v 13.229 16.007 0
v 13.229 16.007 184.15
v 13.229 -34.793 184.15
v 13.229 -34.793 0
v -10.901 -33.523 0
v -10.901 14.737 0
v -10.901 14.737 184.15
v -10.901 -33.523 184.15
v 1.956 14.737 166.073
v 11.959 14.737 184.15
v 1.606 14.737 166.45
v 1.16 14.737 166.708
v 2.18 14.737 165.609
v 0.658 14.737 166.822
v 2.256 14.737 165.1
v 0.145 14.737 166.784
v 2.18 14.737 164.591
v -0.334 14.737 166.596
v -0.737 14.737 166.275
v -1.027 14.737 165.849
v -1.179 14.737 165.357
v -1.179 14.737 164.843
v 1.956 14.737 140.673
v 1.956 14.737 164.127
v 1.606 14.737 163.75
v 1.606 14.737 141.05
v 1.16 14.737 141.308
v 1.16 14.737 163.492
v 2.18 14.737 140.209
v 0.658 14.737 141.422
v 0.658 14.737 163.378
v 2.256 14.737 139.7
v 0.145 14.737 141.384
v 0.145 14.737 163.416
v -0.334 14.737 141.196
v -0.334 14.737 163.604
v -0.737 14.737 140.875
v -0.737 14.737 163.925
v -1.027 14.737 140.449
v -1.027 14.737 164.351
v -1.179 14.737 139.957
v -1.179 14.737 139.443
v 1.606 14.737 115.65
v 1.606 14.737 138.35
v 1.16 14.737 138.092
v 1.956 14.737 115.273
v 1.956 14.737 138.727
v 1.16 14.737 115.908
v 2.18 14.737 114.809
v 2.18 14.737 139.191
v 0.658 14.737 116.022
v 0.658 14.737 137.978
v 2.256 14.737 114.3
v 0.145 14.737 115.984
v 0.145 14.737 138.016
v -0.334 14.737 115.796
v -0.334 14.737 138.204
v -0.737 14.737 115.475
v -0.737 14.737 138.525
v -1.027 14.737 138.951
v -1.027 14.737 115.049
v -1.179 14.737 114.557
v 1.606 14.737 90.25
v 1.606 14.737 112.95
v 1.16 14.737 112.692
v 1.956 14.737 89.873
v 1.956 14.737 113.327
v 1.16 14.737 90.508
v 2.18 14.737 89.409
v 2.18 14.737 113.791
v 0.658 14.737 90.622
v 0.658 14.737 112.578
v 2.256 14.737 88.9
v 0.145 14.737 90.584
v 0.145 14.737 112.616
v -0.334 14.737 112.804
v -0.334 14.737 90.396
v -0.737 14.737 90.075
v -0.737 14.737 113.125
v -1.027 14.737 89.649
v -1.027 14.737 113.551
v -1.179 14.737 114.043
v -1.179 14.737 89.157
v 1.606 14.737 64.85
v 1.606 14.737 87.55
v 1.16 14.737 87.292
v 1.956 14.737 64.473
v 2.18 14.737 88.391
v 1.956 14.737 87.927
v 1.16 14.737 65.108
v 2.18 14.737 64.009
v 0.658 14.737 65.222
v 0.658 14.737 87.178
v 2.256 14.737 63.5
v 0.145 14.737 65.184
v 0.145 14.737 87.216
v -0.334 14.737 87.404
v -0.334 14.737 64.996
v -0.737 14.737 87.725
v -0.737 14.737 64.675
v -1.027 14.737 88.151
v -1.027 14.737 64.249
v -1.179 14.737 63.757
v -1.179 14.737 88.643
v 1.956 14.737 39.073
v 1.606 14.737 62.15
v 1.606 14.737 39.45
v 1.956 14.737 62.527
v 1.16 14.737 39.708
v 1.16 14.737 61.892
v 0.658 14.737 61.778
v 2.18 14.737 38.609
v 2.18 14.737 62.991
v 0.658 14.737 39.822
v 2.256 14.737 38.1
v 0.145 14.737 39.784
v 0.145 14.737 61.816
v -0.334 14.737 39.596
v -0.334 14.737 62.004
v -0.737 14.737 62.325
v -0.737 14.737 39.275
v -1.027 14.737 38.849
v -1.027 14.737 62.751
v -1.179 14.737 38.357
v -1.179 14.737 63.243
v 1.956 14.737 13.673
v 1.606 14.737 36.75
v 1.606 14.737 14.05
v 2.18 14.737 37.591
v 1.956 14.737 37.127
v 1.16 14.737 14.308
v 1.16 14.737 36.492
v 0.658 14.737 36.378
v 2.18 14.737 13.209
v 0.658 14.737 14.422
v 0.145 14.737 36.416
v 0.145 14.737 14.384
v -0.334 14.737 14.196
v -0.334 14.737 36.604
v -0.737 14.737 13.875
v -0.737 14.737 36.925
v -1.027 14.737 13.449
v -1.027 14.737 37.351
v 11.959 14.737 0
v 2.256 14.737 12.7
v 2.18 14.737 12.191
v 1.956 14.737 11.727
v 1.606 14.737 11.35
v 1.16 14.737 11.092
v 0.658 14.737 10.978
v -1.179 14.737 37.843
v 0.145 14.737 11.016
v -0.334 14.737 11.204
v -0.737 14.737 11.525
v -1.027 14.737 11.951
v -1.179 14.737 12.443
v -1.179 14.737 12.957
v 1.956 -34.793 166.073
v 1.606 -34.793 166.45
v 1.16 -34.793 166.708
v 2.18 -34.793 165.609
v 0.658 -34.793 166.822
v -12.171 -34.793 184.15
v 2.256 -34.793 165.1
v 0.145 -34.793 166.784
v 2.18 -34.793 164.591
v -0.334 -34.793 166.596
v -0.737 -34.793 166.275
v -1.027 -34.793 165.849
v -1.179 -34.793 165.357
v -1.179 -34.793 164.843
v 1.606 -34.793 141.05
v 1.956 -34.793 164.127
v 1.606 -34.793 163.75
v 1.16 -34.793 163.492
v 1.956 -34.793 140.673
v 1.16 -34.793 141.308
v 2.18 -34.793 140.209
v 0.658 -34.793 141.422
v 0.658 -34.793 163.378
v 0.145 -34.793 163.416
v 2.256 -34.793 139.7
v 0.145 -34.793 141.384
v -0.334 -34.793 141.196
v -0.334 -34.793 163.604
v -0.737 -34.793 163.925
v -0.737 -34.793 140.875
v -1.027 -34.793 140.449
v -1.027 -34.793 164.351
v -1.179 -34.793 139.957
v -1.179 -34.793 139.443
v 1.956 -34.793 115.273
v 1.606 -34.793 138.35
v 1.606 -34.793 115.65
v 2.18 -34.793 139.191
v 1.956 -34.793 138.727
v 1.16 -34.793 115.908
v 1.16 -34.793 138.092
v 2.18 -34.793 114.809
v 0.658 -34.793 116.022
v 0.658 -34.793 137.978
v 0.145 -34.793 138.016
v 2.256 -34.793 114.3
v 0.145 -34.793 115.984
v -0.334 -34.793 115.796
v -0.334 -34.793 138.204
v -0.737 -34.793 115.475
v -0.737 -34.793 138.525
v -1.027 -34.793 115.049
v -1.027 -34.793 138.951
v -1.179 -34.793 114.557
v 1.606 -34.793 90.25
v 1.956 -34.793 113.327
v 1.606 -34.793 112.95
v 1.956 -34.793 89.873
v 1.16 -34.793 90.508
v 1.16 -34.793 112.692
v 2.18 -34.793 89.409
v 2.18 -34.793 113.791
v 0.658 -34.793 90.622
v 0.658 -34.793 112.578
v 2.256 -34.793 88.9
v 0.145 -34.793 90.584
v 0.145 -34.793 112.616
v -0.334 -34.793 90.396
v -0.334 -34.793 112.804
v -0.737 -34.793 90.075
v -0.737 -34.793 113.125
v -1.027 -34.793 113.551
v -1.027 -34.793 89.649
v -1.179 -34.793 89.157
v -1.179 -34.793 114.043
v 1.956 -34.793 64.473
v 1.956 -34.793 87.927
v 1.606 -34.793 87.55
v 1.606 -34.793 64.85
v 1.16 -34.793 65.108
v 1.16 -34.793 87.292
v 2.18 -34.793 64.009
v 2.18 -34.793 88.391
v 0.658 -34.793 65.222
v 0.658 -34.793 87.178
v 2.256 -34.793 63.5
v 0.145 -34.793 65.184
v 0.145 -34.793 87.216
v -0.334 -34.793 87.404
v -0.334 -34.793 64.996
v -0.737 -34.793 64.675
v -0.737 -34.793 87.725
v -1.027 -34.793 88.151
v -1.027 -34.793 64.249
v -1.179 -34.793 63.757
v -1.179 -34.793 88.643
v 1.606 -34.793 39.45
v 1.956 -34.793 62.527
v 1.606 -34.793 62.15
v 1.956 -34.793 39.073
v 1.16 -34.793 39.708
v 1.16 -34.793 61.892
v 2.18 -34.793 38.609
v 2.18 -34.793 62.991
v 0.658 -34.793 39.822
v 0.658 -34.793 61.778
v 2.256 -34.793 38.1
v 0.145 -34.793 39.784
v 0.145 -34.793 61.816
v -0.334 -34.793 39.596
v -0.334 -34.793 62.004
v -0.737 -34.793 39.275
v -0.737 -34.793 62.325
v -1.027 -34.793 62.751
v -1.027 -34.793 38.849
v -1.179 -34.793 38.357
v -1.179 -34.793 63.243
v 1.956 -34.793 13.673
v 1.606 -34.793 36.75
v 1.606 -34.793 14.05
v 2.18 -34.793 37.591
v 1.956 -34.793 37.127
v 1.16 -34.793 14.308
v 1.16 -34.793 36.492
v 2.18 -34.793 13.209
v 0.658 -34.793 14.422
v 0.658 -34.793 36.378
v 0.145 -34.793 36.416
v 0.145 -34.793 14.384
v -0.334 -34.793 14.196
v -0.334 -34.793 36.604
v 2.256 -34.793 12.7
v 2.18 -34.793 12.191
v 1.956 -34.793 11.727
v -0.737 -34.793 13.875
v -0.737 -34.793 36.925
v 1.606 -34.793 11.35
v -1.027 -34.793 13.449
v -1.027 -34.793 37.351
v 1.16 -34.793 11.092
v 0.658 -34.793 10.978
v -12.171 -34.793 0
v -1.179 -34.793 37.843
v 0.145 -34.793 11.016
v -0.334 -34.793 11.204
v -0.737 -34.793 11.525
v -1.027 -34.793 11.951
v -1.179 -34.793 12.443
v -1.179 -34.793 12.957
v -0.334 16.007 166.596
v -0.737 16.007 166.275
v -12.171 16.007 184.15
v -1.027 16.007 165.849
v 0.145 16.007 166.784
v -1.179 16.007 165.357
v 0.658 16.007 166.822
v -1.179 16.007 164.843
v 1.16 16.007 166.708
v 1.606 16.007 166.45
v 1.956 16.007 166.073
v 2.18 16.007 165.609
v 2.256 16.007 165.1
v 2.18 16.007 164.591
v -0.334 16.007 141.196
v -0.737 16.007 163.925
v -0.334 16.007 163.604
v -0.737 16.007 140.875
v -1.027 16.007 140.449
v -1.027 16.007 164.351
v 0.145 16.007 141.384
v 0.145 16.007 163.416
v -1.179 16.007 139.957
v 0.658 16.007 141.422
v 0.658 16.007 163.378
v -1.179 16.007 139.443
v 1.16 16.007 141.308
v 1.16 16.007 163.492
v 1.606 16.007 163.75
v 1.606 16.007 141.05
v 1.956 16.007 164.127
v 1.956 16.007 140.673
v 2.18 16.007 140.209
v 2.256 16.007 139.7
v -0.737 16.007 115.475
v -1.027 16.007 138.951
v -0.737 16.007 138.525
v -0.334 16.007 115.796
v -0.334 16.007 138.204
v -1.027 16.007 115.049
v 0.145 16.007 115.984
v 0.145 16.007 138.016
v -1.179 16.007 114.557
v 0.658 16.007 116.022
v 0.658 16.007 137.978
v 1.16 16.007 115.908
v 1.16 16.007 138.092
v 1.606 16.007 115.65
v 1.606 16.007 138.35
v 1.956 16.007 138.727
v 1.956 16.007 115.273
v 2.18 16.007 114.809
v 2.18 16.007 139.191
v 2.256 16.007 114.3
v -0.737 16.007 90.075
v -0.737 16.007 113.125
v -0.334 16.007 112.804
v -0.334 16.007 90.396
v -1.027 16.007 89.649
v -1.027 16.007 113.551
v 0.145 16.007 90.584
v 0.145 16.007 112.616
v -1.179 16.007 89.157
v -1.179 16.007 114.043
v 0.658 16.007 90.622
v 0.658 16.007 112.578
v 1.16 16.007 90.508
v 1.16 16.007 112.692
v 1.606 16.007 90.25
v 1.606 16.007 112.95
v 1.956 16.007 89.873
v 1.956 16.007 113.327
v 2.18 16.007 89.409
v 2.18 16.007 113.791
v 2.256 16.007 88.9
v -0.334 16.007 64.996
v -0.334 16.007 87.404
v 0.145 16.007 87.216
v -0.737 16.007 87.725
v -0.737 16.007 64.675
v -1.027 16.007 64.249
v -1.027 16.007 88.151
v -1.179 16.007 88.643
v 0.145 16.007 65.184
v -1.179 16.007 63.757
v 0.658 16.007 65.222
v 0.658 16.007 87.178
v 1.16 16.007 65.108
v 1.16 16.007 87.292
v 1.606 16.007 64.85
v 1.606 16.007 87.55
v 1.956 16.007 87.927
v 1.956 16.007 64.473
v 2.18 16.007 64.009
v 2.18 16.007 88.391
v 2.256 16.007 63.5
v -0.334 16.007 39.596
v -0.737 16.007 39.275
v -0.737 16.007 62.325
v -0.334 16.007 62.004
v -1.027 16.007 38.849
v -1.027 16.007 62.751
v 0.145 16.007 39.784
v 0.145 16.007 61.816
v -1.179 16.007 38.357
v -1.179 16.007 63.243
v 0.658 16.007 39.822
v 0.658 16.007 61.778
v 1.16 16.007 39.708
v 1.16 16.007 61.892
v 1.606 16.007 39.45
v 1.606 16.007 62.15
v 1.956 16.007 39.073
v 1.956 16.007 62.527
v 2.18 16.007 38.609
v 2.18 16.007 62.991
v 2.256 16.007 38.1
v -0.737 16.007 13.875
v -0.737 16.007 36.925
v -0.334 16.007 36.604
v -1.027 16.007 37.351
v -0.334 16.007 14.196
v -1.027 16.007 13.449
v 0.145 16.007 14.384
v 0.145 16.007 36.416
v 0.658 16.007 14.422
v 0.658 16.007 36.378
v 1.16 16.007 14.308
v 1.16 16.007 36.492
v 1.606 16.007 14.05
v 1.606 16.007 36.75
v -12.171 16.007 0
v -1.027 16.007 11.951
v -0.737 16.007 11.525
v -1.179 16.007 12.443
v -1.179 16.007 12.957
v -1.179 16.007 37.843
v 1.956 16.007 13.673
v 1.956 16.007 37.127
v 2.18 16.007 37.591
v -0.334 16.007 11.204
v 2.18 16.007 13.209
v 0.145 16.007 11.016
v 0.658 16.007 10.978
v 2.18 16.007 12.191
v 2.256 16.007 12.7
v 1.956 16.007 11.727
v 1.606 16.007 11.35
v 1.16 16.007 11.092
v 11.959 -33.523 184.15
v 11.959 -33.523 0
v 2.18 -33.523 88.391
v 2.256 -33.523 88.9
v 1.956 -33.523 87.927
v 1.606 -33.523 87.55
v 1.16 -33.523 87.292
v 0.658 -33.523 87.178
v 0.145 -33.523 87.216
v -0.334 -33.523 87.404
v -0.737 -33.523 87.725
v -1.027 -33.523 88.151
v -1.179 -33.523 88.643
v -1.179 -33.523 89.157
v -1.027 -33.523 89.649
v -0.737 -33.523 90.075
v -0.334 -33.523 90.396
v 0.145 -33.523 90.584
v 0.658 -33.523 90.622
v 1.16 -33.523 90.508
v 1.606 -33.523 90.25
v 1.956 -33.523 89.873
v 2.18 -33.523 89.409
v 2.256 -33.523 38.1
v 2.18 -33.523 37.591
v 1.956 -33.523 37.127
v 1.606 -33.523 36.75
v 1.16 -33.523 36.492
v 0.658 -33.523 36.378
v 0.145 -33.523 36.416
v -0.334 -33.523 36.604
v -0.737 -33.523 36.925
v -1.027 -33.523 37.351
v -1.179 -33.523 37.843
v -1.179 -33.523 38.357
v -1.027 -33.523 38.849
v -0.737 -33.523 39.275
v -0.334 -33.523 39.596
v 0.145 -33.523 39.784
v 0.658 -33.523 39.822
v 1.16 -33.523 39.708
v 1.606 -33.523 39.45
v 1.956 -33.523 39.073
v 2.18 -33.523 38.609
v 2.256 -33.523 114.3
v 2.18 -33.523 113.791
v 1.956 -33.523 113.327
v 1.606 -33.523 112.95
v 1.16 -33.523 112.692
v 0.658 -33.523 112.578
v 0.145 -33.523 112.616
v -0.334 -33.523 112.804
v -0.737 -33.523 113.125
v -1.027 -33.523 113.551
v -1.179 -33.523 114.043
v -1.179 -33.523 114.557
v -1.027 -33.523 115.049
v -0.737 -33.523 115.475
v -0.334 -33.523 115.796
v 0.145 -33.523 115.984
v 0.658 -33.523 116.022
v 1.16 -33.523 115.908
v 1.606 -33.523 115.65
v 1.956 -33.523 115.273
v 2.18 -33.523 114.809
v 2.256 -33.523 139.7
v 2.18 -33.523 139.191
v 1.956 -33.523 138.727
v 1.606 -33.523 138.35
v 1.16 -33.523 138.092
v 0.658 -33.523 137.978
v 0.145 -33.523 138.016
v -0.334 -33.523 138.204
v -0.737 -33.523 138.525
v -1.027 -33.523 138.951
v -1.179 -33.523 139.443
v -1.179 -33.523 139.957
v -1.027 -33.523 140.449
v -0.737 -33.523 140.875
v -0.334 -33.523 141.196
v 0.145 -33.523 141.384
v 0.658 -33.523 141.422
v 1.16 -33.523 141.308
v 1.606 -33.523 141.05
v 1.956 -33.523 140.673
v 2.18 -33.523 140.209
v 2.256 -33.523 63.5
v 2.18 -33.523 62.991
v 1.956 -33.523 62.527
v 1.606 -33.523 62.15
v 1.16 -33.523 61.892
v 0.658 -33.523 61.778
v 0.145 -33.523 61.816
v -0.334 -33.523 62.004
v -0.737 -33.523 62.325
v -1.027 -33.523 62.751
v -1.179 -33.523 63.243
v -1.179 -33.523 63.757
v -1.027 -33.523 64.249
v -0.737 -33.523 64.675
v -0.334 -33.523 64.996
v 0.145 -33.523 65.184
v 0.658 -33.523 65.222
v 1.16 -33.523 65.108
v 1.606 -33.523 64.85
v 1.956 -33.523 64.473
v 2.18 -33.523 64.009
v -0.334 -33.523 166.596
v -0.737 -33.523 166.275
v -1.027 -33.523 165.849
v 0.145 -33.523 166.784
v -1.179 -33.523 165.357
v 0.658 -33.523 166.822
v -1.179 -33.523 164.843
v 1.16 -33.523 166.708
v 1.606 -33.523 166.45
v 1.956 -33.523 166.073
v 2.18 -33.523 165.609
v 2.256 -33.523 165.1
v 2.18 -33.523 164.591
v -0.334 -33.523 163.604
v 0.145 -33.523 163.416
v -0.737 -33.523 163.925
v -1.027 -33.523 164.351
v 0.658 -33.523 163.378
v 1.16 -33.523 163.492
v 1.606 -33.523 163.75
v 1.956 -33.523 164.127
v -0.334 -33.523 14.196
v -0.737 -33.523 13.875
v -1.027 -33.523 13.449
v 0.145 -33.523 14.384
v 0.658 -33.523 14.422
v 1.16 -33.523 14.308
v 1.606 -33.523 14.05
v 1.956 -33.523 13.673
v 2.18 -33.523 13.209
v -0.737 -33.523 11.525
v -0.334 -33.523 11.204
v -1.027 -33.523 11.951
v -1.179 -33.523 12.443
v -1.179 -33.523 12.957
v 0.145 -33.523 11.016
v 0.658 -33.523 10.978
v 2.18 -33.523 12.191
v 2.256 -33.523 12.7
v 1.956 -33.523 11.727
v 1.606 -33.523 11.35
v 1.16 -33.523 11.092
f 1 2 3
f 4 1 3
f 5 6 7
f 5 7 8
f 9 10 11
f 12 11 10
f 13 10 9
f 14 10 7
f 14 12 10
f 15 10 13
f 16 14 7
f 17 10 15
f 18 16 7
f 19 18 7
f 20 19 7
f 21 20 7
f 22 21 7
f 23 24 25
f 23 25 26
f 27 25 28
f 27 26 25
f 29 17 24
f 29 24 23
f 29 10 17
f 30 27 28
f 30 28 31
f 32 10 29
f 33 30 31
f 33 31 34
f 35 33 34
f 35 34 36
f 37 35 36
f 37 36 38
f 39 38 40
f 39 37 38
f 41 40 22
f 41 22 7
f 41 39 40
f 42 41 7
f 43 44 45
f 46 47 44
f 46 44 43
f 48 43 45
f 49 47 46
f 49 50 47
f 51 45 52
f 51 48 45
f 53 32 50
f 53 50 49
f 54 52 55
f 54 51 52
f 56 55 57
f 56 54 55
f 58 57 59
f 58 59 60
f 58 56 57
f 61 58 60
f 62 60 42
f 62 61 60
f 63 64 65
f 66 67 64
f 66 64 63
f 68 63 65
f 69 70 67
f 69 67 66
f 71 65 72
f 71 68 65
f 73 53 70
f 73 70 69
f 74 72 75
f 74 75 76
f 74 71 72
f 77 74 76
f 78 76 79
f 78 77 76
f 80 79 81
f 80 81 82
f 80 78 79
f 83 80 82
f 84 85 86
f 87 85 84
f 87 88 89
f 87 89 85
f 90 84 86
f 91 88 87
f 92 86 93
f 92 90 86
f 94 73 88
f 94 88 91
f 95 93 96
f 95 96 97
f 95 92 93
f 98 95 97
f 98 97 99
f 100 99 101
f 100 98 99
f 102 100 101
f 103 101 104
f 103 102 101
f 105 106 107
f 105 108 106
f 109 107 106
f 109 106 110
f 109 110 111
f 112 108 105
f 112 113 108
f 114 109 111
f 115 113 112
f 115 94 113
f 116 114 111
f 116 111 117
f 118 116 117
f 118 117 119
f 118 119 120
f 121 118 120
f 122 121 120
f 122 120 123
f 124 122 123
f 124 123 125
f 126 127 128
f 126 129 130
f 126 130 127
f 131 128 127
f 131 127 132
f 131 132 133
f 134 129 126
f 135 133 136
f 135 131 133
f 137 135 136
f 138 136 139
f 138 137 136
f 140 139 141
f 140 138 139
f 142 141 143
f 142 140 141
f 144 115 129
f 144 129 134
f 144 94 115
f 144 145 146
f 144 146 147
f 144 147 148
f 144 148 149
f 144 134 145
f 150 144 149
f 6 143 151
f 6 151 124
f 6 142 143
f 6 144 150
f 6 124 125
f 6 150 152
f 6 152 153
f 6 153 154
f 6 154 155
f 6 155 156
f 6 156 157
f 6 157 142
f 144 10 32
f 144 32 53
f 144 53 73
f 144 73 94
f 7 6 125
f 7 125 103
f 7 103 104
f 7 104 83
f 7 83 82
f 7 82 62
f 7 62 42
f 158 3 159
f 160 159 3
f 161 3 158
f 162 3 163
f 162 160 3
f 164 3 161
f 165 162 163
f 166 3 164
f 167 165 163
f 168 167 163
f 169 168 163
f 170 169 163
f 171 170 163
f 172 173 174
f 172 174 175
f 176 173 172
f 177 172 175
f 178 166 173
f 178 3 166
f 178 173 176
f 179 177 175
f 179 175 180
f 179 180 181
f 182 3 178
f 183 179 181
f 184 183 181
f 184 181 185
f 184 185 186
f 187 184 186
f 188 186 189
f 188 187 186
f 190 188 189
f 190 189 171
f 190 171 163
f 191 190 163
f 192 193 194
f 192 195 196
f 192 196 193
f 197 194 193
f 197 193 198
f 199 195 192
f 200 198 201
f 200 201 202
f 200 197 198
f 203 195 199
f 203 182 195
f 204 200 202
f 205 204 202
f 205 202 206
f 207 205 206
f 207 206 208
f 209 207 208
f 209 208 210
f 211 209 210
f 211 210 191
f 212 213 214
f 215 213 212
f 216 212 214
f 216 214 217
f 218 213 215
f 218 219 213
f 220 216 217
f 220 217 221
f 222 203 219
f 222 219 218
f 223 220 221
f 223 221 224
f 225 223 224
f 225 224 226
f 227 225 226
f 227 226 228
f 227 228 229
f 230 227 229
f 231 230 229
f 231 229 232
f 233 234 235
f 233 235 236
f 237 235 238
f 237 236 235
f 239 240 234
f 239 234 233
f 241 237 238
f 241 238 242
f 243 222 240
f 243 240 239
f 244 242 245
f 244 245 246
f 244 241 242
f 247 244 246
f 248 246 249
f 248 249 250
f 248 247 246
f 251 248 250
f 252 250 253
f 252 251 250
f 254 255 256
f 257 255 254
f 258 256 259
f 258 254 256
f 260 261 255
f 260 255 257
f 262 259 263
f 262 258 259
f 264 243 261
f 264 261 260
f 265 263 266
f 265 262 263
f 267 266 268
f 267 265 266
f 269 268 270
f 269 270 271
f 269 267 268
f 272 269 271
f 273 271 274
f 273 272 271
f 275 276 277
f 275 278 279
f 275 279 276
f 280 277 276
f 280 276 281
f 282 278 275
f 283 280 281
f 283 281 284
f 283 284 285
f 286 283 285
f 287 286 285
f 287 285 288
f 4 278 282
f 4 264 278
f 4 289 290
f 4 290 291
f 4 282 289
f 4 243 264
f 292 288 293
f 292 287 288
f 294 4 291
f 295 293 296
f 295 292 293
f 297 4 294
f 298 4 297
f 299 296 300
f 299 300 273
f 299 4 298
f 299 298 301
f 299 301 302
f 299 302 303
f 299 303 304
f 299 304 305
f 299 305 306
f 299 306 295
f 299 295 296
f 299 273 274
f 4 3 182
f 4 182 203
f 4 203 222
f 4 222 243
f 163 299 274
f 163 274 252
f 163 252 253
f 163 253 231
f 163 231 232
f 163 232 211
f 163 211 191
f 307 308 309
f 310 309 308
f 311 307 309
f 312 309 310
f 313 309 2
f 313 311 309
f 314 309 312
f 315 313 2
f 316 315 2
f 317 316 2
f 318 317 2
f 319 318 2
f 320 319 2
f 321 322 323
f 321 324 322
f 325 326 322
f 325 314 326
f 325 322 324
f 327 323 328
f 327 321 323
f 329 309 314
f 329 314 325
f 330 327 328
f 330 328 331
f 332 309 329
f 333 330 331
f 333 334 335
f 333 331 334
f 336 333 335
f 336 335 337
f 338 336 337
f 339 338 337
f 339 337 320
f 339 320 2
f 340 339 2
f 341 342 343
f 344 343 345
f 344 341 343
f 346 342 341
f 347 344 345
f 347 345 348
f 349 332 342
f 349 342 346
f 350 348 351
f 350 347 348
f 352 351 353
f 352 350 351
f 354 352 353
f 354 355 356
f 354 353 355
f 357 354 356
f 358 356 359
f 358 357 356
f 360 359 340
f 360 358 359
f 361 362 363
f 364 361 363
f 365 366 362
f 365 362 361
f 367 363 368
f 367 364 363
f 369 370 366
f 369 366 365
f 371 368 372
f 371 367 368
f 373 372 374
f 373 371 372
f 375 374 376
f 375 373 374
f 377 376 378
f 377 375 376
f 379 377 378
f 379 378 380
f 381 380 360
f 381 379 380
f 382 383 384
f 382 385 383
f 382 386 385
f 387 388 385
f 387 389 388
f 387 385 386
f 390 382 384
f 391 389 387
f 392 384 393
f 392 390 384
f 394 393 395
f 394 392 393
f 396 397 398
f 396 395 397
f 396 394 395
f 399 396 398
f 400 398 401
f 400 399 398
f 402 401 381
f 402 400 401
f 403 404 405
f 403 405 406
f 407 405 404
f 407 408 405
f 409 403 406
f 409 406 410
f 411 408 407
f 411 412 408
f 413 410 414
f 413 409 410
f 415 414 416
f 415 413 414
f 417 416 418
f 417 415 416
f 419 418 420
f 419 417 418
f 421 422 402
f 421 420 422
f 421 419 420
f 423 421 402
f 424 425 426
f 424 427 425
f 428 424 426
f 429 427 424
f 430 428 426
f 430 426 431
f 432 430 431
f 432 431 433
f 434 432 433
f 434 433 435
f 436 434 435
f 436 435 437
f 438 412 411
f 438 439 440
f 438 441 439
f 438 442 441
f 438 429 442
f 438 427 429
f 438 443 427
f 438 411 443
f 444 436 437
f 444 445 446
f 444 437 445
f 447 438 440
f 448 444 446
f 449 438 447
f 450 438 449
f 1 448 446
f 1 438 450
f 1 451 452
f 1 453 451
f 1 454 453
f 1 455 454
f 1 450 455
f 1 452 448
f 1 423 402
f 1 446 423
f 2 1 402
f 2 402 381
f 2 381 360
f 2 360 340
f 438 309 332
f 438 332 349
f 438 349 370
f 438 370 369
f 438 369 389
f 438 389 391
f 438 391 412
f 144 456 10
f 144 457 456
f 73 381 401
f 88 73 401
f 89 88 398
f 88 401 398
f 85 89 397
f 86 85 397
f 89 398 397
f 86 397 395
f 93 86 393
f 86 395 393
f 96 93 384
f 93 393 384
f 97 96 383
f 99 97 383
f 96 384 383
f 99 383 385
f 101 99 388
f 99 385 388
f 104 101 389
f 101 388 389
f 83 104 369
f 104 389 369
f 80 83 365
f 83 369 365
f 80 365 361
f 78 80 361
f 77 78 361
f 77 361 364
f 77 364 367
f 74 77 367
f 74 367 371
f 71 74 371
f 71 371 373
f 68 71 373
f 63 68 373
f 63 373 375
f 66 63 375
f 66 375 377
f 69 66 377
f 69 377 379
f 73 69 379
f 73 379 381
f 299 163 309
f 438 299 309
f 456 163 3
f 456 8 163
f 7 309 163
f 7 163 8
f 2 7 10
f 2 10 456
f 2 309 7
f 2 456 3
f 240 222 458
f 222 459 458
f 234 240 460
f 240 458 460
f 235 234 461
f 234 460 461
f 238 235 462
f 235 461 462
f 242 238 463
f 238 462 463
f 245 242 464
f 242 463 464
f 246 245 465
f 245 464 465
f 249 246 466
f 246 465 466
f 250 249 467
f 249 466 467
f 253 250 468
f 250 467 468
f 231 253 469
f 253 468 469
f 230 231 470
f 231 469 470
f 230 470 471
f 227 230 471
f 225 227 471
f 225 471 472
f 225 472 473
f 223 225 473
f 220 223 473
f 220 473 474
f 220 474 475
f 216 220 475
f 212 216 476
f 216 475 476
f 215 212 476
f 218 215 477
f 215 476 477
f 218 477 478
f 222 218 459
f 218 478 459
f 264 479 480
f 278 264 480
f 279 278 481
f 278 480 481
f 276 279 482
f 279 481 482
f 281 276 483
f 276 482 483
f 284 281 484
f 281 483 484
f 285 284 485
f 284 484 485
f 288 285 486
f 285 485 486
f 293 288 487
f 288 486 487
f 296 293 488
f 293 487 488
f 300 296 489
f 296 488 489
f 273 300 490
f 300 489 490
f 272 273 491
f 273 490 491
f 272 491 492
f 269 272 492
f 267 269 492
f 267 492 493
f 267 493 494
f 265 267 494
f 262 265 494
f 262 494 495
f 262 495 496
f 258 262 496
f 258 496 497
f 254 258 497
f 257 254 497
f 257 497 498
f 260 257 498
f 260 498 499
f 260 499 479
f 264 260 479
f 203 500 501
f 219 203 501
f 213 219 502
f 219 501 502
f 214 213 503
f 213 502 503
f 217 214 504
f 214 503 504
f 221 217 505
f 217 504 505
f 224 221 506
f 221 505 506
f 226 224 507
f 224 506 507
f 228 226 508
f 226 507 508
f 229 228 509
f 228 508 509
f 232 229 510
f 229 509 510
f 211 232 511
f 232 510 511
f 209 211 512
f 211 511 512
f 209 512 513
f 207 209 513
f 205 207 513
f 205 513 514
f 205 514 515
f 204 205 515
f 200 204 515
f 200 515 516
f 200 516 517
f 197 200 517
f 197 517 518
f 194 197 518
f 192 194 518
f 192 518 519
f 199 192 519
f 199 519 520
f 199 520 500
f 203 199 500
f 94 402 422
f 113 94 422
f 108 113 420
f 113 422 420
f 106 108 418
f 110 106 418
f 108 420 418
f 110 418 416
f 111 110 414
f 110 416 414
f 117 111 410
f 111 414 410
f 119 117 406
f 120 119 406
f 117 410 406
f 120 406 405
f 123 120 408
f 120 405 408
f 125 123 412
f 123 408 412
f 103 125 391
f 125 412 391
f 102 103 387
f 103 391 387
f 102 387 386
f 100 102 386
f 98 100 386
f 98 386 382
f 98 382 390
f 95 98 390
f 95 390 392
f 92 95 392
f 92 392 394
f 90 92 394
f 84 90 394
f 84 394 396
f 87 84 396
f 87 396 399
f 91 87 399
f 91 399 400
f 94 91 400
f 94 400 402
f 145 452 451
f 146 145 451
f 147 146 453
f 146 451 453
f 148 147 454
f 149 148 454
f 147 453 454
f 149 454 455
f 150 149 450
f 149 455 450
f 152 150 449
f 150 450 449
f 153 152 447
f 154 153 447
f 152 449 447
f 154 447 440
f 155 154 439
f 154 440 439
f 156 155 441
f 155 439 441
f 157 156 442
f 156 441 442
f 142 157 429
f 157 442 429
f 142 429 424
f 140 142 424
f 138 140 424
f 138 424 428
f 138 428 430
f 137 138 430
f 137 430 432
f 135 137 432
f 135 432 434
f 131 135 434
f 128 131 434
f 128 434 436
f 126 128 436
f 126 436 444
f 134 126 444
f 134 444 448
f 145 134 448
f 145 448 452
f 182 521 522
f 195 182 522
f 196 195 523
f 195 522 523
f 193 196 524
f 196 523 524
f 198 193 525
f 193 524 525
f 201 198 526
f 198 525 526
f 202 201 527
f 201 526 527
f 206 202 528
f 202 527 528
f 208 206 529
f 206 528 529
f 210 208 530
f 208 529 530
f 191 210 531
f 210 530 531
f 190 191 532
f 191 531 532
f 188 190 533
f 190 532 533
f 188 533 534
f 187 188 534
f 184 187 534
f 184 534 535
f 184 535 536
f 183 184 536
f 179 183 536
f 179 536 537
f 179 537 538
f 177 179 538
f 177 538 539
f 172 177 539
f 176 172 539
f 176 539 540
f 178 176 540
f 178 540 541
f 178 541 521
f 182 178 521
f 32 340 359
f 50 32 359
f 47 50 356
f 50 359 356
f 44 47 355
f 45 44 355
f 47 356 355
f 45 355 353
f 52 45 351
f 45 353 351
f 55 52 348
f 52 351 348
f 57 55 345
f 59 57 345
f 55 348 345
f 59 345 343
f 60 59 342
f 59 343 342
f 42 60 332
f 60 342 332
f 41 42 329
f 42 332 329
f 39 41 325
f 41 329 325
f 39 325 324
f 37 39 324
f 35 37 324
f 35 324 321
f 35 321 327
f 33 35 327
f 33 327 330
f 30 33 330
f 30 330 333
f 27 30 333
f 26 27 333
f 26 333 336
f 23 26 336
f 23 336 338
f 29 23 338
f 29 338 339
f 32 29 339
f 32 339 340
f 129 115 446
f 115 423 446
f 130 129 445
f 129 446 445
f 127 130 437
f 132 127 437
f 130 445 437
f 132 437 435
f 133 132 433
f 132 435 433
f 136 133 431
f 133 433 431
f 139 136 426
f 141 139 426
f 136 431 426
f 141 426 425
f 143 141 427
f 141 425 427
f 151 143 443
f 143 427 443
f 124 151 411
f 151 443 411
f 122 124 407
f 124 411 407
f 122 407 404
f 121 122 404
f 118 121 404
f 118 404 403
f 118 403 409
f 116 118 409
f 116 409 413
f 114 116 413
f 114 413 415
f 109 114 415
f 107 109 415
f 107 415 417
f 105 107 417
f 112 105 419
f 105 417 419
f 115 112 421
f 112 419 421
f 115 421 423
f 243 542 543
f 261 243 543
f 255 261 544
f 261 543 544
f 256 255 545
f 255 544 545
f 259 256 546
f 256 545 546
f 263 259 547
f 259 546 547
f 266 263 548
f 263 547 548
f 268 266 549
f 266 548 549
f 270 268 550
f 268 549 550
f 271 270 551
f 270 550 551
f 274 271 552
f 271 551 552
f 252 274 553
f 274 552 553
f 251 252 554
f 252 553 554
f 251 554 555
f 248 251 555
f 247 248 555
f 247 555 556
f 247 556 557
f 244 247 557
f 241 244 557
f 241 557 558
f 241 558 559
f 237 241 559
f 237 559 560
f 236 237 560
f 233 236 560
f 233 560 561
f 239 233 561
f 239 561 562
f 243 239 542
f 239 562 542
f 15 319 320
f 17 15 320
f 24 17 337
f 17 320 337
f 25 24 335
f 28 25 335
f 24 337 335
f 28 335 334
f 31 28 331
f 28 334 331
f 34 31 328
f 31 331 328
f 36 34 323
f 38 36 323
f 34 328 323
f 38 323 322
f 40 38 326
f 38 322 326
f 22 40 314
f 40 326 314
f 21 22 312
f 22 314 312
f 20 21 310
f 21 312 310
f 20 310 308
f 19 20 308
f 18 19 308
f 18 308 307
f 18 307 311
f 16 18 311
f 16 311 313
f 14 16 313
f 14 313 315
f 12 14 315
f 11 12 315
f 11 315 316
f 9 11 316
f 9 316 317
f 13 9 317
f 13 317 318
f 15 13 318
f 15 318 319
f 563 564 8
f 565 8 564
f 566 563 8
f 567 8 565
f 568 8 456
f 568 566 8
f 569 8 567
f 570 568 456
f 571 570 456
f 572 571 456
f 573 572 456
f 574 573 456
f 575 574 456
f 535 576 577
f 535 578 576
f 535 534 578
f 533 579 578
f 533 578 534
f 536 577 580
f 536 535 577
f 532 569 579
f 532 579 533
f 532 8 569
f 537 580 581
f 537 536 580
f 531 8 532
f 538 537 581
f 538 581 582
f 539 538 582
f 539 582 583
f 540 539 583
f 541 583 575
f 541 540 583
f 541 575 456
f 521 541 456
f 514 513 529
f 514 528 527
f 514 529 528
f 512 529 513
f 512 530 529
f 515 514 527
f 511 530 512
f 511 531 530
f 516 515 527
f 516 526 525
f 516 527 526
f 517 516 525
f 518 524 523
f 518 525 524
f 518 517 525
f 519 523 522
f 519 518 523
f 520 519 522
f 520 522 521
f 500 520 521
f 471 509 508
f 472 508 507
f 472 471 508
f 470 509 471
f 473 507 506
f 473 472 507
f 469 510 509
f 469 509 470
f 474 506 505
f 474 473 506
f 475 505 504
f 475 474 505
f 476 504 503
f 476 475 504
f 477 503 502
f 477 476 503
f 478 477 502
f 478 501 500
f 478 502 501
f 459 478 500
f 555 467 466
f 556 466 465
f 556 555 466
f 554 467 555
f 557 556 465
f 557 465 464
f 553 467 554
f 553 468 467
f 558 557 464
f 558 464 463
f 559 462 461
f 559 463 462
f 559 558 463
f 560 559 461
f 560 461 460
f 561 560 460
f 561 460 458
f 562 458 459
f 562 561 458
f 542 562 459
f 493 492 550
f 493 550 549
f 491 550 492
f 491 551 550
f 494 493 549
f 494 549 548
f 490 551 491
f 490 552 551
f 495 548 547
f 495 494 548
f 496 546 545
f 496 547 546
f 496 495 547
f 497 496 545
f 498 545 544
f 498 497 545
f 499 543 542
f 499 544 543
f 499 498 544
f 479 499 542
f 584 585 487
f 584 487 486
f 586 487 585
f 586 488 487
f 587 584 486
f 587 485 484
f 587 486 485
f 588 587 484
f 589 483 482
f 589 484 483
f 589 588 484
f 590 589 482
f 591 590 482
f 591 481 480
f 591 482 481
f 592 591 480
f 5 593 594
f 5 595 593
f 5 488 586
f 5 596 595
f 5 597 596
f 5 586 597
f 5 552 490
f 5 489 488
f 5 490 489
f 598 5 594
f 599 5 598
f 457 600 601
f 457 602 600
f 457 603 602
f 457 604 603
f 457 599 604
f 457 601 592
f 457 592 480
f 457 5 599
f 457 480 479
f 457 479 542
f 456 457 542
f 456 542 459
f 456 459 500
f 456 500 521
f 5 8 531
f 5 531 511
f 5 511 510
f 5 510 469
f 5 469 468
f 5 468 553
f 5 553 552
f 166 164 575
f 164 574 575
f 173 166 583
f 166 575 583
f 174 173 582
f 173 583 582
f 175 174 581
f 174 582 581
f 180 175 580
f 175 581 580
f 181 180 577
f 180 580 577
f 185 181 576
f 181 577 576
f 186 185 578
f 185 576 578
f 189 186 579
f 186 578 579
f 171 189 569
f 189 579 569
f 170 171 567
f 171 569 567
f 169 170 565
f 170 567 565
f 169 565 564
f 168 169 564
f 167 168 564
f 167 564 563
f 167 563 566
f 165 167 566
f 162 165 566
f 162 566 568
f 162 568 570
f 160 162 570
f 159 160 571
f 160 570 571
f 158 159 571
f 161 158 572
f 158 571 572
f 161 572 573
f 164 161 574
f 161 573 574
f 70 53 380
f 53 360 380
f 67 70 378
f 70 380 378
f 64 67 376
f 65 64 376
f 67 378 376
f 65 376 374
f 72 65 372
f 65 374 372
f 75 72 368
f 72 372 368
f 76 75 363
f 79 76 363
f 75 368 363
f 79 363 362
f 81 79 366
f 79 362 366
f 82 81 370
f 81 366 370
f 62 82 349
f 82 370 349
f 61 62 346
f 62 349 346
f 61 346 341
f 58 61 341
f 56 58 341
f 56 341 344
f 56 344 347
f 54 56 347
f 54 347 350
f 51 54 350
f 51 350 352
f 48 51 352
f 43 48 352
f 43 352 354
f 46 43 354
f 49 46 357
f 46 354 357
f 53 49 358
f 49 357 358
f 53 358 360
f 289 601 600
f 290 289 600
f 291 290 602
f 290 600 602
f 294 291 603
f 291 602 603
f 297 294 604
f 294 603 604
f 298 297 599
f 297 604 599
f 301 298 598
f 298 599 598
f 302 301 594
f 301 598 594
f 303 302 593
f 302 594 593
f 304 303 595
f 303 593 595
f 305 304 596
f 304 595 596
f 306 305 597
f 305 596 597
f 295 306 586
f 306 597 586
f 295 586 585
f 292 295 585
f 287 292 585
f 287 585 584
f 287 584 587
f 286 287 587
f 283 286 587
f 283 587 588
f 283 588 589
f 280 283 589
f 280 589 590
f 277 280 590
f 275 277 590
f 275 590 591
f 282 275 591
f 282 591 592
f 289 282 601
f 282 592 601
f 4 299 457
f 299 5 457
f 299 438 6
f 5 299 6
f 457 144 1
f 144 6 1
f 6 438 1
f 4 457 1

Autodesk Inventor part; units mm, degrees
ref_plane "YZ Plane" through (0, 0, 0) normal (1, 0, 0) x (0, 1, 0)
ref_plane "XZ Plane" through (0, 0, 0) normal (0, 1, 0) x (-1, 0, 0)
ref_plane "XY Plane" through (0, 0, 0) normal (0, 0, 1) x (1, 0, 0)
sketch "Sketch1" plane through (0, 0, 0) normal (0, 0, 1) x (1, 0, 0)
  line L0 (-12.1708, 16.0073) -> (13.2292, 16.0073)
  line L1 (13.2292, 16.0073) -> (13.2292, -34.7927)
  line L2 (13.2292, -34.7927) -> (-12.1708, -34.7927)
  line L3 (-12.1708, -34.7927) -> (-12.1708, 16.0073)
  line L4 (11.9592, 14.7373) -> (-10.9008, 14.7373)
  line L5 (-10.9008, 14.7373) -> (-10.9008, -33.5227)
  line L6 (-10.9008, -33.5227) -> (11.9592, -33.5227)
  line L7 (11.9592, -33.5227) -> (11.9592, 14.7373)
  point P0 (0, 0)
  dimension "d0" = 25.4
  dimension "d1" = 50.8
  dimension "d2" = 1.27
extrude "Extrusion1" add sketch "Sketch1" along normal blind 184.15
sketch "Sketch2" plane through (-12.1708, 16.0073, 0) normal (0, 1, 0) x (1, 0, 0)
  circle A0 centre (12.7, -12.7) radius 1.7272
  line L0 (25.4, 0) -> (0, 0) projected
  line L1 (0, 0) -> (0, -184.15) projected
  point P0 (12.1708, 0)
  dimension "d5" = 3.4544
  dimension "d6" = 12.7
  dimension "d7" = 12.7
extrude "Extrusion2" cut sketch "Sketch2" against normal through all
pattern_linear "Rectangular Pattern1" count 71 spacing 25.4 along (0, 0, 1) of "Extrusion2"
equation "\"d10\" = d14"
equation "\"d13\" = 711.2"
equation "\"d14\" = d13"
properties part number "VersaFrame_IndexSupp"
